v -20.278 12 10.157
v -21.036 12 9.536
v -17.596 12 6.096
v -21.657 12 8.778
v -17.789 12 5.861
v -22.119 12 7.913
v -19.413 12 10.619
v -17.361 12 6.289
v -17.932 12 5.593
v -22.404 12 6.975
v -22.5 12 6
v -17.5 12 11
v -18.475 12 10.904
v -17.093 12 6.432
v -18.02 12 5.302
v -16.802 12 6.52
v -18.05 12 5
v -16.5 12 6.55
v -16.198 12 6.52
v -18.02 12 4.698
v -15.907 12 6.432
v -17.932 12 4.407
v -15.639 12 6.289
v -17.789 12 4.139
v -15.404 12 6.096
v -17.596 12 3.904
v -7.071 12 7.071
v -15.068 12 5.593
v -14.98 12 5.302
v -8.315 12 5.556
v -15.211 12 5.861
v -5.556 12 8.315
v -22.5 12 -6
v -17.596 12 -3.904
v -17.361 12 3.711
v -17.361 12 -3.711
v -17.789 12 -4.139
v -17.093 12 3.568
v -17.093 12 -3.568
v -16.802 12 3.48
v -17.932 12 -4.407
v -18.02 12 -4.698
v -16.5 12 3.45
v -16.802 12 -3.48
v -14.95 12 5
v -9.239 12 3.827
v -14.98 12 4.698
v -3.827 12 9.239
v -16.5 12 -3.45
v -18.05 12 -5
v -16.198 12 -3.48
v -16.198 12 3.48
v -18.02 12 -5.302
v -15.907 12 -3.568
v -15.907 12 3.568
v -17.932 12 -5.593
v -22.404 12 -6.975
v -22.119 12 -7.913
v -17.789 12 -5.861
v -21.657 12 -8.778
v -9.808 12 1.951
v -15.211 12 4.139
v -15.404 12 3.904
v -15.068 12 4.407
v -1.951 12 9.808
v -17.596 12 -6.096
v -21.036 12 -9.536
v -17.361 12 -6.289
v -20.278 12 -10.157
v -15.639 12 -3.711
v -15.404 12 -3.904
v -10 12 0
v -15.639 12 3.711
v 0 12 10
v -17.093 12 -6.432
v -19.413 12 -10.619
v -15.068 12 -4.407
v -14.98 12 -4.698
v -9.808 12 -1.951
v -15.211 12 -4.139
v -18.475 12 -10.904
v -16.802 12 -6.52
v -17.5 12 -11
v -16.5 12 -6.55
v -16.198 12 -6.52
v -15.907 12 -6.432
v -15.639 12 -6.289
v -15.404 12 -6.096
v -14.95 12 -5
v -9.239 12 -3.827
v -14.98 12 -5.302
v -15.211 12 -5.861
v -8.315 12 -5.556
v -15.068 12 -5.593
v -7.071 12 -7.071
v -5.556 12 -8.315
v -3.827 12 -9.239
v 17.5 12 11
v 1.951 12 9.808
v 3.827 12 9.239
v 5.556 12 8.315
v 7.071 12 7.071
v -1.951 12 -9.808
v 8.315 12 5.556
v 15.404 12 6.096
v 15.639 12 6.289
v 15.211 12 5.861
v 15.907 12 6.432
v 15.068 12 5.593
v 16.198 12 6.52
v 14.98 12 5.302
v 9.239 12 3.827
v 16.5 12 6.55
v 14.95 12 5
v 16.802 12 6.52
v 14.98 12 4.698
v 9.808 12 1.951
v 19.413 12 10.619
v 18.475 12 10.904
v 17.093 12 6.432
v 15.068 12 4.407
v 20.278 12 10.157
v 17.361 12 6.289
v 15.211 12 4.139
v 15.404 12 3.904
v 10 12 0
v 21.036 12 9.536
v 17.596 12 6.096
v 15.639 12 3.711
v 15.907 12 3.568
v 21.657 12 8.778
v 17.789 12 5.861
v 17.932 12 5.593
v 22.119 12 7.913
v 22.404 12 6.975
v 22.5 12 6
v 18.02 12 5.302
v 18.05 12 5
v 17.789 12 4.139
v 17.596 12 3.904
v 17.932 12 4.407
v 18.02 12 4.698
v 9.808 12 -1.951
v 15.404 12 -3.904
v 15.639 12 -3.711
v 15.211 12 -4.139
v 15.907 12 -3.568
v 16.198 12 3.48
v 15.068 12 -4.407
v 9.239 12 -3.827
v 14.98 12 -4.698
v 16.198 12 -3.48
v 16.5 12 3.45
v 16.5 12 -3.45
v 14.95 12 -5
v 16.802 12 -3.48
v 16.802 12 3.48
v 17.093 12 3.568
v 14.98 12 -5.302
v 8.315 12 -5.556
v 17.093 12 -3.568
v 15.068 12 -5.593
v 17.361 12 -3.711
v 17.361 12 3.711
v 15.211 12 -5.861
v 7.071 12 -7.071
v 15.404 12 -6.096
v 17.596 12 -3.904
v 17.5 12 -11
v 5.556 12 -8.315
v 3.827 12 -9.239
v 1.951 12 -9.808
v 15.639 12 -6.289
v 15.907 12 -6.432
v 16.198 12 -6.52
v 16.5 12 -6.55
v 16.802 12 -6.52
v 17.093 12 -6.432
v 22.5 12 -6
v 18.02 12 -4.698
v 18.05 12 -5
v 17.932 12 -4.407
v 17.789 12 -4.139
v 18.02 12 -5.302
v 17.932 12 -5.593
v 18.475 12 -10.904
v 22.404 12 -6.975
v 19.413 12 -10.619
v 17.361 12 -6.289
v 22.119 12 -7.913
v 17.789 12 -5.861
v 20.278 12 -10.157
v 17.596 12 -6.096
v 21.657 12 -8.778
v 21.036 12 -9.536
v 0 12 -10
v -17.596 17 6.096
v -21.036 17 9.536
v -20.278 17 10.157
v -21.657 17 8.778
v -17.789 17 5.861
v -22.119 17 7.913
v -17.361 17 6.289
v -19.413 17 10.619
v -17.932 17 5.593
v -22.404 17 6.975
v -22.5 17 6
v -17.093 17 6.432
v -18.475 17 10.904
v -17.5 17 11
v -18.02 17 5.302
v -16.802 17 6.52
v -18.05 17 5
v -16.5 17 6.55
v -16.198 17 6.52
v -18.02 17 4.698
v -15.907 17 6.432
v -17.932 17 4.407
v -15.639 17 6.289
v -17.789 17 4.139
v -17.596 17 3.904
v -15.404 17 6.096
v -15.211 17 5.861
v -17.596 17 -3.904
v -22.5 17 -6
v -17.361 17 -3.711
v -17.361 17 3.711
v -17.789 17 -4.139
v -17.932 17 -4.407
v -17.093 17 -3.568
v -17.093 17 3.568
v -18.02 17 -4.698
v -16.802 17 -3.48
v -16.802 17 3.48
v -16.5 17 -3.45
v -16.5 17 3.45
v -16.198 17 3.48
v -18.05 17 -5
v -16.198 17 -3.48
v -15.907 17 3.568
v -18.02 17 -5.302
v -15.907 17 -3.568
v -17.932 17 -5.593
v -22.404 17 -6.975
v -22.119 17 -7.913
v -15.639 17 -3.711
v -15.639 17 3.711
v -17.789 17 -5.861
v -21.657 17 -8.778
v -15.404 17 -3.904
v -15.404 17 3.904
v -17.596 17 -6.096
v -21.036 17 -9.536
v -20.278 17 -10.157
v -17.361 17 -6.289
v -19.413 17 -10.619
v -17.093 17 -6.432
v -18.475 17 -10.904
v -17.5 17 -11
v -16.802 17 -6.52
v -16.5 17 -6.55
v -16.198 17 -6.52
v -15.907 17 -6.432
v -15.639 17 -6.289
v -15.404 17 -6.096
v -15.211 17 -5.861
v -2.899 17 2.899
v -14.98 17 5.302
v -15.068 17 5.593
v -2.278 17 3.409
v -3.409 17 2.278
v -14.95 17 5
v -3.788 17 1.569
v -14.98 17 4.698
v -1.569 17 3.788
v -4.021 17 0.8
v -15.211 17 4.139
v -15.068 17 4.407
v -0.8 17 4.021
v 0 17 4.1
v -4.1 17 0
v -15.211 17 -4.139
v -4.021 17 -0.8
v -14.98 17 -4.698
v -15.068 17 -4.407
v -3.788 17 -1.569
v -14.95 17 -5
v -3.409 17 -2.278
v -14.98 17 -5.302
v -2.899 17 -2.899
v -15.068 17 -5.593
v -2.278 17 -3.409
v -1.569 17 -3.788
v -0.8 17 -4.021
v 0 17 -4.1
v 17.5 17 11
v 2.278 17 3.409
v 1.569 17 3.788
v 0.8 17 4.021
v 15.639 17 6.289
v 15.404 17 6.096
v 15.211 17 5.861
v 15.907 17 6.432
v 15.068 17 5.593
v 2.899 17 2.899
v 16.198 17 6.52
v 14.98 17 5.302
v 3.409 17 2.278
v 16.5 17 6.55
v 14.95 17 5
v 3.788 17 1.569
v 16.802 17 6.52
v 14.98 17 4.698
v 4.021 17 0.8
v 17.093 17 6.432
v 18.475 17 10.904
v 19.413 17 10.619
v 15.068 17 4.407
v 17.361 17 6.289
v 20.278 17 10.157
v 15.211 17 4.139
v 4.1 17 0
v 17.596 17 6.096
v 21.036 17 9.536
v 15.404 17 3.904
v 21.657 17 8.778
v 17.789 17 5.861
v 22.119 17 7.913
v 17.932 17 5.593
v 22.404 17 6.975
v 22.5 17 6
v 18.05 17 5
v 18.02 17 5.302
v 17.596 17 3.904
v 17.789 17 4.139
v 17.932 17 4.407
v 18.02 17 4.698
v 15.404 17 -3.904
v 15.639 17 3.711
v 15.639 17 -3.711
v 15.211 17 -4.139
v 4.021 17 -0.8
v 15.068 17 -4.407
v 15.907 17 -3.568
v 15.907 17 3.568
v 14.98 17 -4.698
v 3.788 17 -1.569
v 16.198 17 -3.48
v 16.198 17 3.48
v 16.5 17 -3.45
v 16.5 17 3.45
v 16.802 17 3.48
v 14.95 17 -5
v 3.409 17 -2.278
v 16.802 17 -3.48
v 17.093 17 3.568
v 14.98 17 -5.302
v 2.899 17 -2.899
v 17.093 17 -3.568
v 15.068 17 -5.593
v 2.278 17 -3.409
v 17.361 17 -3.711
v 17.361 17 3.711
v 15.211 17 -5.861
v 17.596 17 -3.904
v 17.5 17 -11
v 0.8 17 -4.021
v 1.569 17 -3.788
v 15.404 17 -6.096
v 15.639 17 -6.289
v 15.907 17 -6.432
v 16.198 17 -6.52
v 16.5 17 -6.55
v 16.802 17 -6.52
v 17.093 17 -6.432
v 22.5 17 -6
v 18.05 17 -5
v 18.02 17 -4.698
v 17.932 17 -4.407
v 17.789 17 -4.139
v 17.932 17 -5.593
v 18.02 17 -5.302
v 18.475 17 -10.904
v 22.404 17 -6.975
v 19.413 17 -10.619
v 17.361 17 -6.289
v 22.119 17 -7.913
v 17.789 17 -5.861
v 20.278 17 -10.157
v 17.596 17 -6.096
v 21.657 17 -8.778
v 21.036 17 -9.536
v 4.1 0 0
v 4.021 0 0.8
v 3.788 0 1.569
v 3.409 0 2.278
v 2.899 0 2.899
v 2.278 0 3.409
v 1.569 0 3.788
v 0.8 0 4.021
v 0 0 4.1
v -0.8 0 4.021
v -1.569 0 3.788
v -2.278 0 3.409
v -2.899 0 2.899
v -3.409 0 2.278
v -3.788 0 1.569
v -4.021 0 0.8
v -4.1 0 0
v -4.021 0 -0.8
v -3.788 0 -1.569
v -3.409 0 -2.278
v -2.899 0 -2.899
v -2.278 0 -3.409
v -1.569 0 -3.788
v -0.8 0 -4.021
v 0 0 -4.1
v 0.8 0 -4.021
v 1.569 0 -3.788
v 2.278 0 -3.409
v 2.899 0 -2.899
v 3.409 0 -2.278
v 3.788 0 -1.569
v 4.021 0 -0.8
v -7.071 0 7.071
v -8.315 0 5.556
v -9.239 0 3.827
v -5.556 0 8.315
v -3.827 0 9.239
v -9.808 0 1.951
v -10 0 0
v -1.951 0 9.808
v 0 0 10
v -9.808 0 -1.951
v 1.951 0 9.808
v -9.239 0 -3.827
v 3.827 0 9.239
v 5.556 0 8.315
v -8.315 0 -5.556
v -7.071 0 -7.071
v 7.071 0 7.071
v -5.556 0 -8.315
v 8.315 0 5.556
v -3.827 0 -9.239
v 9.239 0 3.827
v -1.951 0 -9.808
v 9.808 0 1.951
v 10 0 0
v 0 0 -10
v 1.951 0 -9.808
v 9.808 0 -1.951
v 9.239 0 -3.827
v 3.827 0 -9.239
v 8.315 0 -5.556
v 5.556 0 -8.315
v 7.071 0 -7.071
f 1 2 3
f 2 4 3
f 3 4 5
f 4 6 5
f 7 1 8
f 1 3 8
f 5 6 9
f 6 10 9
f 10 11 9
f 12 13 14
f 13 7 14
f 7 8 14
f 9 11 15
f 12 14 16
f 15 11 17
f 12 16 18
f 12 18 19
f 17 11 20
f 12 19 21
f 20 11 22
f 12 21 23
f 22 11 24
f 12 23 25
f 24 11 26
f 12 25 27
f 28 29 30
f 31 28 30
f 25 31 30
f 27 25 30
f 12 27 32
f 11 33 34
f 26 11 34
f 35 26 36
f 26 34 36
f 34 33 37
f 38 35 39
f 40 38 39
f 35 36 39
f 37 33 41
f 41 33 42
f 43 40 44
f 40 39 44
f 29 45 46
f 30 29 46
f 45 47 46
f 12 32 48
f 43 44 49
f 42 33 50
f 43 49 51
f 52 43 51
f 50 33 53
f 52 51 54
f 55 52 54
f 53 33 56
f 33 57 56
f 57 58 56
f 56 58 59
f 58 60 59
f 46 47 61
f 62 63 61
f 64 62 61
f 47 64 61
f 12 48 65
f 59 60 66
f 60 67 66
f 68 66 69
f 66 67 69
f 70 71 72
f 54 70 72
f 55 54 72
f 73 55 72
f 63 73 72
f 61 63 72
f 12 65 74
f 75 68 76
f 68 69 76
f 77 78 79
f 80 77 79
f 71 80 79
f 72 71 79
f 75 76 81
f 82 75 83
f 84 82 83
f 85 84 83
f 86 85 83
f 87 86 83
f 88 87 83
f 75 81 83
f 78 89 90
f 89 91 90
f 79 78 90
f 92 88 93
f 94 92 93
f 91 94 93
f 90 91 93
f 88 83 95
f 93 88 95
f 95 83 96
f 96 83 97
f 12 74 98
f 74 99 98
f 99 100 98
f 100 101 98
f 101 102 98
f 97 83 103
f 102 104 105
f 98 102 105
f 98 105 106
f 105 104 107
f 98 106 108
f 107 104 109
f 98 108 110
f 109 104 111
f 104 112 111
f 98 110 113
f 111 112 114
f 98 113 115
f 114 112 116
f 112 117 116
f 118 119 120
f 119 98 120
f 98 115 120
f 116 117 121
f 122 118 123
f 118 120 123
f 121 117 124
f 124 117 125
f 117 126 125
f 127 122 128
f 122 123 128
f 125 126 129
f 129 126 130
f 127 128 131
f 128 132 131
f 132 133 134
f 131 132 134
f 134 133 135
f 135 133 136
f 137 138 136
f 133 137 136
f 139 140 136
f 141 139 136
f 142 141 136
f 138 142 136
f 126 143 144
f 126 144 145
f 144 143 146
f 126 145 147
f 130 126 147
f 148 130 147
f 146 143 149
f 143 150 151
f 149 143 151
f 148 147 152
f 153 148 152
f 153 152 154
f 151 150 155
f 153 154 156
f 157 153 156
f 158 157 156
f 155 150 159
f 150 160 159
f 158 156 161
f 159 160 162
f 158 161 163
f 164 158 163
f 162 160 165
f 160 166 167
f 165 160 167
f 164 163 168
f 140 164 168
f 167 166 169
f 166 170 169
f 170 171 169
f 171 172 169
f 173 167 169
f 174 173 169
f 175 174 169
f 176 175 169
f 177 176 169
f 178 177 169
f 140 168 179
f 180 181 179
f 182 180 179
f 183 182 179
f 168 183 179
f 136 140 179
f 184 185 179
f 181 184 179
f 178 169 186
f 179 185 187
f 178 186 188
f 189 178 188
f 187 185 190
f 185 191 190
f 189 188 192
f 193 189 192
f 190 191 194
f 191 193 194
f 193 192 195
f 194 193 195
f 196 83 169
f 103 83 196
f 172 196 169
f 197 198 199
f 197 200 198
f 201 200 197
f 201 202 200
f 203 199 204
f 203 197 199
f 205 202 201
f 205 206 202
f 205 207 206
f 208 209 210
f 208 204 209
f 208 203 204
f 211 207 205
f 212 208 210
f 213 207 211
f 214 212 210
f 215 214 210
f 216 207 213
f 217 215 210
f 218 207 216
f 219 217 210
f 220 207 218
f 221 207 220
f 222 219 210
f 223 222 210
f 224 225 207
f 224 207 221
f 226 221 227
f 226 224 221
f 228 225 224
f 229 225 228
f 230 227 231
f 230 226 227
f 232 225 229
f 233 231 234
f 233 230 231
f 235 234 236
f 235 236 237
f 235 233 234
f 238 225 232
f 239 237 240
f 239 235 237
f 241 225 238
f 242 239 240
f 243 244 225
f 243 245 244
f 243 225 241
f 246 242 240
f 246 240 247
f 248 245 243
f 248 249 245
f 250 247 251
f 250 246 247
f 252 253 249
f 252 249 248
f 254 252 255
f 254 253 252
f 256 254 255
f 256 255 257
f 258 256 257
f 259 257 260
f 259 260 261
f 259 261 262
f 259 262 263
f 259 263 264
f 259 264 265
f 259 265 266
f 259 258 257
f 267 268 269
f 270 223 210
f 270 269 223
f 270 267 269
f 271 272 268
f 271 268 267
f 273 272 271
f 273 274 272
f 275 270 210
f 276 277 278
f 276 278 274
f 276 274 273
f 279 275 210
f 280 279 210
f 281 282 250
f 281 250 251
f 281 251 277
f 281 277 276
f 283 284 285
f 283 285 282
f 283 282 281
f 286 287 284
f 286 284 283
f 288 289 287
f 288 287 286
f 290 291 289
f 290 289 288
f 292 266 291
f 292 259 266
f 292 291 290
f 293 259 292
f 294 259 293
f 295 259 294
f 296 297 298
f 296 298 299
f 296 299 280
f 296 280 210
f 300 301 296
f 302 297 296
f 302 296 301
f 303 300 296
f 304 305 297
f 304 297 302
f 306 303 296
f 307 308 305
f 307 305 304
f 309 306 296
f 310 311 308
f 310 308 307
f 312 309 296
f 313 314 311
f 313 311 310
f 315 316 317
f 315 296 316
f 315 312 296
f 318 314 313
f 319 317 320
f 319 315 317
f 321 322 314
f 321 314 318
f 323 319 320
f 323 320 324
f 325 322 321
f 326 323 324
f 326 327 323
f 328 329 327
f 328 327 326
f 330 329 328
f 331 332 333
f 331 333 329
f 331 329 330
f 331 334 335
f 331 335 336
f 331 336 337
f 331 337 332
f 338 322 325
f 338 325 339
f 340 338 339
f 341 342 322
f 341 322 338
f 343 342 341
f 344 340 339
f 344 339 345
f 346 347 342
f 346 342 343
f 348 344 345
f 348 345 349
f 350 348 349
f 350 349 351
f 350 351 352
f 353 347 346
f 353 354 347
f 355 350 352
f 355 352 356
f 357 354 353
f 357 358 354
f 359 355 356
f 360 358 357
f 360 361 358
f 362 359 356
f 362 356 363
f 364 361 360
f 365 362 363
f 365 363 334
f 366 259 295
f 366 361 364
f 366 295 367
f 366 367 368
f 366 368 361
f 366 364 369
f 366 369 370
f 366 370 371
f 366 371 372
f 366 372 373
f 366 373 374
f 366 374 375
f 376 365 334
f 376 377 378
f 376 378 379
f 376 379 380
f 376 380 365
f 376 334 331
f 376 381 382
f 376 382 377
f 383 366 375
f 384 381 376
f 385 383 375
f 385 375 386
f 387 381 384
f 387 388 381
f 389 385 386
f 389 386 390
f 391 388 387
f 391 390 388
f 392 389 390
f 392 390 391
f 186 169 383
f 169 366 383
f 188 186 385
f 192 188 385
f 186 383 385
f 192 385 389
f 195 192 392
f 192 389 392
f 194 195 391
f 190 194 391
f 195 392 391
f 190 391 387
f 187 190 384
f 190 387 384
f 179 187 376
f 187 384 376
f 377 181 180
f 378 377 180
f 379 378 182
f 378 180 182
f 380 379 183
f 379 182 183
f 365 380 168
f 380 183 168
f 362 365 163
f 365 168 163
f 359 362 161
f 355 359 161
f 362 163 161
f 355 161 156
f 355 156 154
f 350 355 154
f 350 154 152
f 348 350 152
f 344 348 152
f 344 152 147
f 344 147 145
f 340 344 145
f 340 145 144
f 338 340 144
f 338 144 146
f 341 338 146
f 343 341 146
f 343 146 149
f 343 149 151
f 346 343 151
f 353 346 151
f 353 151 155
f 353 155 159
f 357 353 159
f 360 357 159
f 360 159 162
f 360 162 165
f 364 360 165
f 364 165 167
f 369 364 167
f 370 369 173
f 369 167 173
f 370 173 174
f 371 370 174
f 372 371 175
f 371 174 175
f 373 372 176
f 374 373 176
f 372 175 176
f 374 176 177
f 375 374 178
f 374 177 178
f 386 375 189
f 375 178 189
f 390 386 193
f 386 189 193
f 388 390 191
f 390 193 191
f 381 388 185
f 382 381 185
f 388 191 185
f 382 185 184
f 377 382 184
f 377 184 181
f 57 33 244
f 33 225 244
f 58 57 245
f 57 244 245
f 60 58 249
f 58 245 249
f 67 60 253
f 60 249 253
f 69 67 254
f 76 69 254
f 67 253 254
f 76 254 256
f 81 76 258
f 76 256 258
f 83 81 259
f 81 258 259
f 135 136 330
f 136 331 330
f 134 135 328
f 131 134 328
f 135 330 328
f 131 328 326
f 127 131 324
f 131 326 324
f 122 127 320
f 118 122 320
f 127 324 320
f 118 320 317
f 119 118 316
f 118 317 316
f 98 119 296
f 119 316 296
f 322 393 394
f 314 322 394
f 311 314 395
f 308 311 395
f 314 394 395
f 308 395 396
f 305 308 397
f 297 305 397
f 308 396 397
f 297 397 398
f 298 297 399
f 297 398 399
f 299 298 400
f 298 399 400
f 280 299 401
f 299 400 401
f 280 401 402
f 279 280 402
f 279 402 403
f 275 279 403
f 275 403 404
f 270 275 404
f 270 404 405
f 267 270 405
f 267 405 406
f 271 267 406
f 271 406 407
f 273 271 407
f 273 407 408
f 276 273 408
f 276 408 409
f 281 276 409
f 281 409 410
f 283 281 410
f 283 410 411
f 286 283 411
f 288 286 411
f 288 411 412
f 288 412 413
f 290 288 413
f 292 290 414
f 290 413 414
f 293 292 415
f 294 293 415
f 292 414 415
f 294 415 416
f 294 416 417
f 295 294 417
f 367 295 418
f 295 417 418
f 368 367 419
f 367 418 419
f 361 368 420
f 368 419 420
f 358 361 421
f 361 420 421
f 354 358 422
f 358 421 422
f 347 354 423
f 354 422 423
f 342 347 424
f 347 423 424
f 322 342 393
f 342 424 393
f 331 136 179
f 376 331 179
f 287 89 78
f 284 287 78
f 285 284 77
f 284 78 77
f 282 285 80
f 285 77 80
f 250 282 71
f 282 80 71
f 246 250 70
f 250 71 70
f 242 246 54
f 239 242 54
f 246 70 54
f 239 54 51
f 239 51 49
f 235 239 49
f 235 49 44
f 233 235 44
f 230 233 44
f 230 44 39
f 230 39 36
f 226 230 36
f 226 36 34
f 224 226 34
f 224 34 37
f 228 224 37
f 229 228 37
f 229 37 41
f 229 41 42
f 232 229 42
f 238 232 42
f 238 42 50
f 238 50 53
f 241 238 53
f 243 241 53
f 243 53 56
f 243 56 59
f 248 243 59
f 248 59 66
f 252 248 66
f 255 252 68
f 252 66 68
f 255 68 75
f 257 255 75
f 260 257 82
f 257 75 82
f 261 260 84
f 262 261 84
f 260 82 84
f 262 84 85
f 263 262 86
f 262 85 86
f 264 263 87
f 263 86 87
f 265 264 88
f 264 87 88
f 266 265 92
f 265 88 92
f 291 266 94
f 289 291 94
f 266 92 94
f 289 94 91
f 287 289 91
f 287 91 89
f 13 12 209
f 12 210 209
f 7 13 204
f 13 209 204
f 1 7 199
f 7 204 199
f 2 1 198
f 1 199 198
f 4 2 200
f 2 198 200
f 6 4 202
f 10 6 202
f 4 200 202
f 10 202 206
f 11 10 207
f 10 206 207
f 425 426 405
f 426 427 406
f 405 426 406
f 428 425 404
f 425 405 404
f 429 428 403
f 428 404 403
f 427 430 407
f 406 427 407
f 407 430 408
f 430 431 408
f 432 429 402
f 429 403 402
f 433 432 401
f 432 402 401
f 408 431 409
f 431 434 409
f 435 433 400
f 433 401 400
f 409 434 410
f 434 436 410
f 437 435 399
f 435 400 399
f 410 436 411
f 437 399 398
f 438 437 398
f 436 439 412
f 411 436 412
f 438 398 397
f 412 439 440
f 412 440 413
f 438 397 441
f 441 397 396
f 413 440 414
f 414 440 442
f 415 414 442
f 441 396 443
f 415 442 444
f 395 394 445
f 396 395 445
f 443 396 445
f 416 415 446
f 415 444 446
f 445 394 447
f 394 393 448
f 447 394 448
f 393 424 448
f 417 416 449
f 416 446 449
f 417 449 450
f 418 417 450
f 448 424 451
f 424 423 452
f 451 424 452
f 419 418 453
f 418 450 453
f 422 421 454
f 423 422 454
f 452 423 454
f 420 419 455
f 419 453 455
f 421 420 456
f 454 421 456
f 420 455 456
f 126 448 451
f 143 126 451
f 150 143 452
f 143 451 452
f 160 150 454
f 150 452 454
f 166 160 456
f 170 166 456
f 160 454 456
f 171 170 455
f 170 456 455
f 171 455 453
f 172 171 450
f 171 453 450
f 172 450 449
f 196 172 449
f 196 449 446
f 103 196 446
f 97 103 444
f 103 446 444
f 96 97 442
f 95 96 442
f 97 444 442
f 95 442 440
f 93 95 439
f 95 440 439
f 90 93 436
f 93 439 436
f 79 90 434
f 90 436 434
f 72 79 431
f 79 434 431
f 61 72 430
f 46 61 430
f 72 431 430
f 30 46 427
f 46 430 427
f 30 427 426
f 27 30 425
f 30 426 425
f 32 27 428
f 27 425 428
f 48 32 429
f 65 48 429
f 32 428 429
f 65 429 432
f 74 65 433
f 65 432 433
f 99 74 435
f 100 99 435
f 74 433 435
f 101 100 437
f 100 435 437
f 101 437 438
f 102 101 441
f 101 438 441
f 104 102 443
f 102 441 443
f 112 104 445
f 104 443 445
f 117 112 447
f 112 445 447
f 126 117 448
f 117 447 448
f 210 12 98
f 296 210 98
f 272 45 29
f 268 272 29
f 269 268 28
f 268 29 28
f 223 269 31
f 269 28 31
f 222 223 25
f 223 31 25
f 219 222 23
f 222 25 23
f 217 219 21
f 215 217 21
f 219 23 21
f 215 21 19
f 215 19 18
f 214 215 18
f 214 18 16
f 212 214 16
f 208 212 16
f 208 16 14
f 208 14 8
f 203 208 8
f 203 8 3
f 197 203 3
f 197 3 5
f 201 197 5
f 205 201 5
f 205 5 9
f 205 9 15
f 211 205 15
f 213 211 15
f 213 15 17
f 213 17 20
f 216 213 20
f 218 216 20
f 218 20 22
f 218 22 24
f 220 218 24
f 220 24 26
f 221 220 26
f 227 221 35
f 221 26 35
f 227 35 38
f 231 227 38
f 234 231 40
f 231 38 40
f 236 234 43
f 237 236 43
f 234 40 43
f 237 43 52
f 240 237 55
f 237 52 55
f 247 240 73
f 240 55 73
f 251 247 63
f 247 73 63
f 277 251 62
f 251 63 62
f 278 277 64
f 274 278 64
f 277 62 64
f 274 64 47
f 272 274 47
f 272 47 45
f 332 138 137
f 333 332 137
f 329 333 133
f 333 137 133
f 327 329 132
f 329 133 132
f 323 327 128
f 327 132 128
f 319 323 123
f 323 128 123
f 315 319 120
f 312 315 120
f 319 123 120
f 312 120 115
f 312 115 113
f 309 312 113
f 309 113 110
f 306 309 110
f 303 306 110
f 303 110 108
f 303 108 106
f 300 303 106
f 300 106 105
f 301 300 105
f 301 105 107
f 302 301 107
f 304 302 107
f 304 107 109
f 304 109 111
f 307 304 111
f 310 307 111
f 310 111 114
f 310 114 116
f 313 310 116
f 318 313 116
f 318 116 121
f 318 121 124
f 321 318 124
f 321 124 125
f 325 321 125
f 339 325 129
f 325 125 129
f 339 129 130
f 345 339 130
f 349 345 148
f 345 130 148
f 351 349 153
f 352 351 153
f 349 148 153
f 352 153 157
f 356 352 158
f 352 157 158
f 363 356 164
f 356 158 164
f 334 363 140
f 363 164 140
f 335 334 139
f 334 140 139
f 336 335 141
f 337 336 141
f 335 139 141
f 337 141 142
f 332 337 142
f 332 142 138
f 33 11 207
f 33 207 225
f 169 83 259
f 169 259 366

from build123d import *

# Parameters (mm, degrees)
CROQUIS1_R              = 10
CROQUIS1_R_2            = 3.5
EXTRUIR1_DEPTH          = 12
CROQUIS2_W              = 45
CROQUIS2_H              = 22
SALIENTE_EXTRUIR1_DEPTH = 5
REDONDEO1_R             = 5
REDONDEO2_R             = 5
REDONDEO3_R             = 5
REDONDEO4_R             = 5
CROQUIS3_R              = 4.1
CORTAR_EXTRUIR1_DEPTH   = 45
CROQUIS4_R              = 1.55
CORTAR_EXTRUIR2_DEPTH   = 45


with BuildPart() as part:
    # Croquis1 → Extruir1 (new body)
    with BuildSketch(Plane(origin=(0, 0, 0), x_dir=(1, 0, 0), z_dir=(0, 1, 0))):
        Circle(CROQUIS1_R)
        Circle(CROQUIS1_R_2, mode=Mode.SUBTRACT)
    extrude(amount=EXTRUIR1_DEPTH)

    # Croquis2 → Saliente-Extruir1 (add)
    with BuildSketch(Plane(origin=(0, 12, 0), x_dir=(1, 0, 0), z_dir=(0, 1, 0))):
        Rectangle(CROQUIS2_W, CROQUIS2_H)
    extrude(amount=SALIENTE_EXTRUIR1_DEPTH)

    # Redondeo1
    redondeo1_edges = [part.edges().sort_by_distance(p)[0] for p in [
        (22.5, 14.5, -11),
    ]]
    fillet(redondeo1_edges, radius=REDONDEO1_R)

    # Redondeo2
    redondeo2_edges = [part.edges().sort_by_distance(p)[0] for p in [
        (22.5, 14.5, 11),
    ]]
    fillet(redondeo2_edges, radius=REDONDEO2_R)

    # Redondeo3
    redondeo3_edges = [part.edges().sort_by_distance(p)[0] for p in [
        (-22.5, 14.5, 11),
    ]]
    fillet(redondeo3_edges, radius=REDONDEO3_R)

    # Redondeo4
    redondeo4_edges = [part.edges().sort_by_distance(p)[0] for p in [
        (-22.5, 14.5, -11),
    ]]
    fillet(redondeo4_edges, radius=REDONDEO4_R)

    # Croquis3 → Cortar-Extruir1 (cut)
    with BuildSketch(Plane.XZ):
        Circle(CROQUIS3_R)
    extrude(amount=-CORTAR_EXTRUIR1_DEPTH, mode=Mode.SUBTRACT)

    # Croquis4 → Cortar-Extruir2 (cut)
    with BuildSketch(Plane.XZ.offset(-12)):
        with Locations((-16.5, 5)):
            Circle(CROQUIS4_R)
        with Locations((-16.5, -5)):
            Circle(CROQUIS4_R)
        with Locations((16.5, 5)):
            Circle(CROQUIS4_R)
        with Locations((16.5, -5)):
            Circle(CROQUIS4_R)
    extrude(amount=-CORTAR_EXTRUIR2_DEPTH, mode=Mode.SUBTRACT)


solid = part.part
